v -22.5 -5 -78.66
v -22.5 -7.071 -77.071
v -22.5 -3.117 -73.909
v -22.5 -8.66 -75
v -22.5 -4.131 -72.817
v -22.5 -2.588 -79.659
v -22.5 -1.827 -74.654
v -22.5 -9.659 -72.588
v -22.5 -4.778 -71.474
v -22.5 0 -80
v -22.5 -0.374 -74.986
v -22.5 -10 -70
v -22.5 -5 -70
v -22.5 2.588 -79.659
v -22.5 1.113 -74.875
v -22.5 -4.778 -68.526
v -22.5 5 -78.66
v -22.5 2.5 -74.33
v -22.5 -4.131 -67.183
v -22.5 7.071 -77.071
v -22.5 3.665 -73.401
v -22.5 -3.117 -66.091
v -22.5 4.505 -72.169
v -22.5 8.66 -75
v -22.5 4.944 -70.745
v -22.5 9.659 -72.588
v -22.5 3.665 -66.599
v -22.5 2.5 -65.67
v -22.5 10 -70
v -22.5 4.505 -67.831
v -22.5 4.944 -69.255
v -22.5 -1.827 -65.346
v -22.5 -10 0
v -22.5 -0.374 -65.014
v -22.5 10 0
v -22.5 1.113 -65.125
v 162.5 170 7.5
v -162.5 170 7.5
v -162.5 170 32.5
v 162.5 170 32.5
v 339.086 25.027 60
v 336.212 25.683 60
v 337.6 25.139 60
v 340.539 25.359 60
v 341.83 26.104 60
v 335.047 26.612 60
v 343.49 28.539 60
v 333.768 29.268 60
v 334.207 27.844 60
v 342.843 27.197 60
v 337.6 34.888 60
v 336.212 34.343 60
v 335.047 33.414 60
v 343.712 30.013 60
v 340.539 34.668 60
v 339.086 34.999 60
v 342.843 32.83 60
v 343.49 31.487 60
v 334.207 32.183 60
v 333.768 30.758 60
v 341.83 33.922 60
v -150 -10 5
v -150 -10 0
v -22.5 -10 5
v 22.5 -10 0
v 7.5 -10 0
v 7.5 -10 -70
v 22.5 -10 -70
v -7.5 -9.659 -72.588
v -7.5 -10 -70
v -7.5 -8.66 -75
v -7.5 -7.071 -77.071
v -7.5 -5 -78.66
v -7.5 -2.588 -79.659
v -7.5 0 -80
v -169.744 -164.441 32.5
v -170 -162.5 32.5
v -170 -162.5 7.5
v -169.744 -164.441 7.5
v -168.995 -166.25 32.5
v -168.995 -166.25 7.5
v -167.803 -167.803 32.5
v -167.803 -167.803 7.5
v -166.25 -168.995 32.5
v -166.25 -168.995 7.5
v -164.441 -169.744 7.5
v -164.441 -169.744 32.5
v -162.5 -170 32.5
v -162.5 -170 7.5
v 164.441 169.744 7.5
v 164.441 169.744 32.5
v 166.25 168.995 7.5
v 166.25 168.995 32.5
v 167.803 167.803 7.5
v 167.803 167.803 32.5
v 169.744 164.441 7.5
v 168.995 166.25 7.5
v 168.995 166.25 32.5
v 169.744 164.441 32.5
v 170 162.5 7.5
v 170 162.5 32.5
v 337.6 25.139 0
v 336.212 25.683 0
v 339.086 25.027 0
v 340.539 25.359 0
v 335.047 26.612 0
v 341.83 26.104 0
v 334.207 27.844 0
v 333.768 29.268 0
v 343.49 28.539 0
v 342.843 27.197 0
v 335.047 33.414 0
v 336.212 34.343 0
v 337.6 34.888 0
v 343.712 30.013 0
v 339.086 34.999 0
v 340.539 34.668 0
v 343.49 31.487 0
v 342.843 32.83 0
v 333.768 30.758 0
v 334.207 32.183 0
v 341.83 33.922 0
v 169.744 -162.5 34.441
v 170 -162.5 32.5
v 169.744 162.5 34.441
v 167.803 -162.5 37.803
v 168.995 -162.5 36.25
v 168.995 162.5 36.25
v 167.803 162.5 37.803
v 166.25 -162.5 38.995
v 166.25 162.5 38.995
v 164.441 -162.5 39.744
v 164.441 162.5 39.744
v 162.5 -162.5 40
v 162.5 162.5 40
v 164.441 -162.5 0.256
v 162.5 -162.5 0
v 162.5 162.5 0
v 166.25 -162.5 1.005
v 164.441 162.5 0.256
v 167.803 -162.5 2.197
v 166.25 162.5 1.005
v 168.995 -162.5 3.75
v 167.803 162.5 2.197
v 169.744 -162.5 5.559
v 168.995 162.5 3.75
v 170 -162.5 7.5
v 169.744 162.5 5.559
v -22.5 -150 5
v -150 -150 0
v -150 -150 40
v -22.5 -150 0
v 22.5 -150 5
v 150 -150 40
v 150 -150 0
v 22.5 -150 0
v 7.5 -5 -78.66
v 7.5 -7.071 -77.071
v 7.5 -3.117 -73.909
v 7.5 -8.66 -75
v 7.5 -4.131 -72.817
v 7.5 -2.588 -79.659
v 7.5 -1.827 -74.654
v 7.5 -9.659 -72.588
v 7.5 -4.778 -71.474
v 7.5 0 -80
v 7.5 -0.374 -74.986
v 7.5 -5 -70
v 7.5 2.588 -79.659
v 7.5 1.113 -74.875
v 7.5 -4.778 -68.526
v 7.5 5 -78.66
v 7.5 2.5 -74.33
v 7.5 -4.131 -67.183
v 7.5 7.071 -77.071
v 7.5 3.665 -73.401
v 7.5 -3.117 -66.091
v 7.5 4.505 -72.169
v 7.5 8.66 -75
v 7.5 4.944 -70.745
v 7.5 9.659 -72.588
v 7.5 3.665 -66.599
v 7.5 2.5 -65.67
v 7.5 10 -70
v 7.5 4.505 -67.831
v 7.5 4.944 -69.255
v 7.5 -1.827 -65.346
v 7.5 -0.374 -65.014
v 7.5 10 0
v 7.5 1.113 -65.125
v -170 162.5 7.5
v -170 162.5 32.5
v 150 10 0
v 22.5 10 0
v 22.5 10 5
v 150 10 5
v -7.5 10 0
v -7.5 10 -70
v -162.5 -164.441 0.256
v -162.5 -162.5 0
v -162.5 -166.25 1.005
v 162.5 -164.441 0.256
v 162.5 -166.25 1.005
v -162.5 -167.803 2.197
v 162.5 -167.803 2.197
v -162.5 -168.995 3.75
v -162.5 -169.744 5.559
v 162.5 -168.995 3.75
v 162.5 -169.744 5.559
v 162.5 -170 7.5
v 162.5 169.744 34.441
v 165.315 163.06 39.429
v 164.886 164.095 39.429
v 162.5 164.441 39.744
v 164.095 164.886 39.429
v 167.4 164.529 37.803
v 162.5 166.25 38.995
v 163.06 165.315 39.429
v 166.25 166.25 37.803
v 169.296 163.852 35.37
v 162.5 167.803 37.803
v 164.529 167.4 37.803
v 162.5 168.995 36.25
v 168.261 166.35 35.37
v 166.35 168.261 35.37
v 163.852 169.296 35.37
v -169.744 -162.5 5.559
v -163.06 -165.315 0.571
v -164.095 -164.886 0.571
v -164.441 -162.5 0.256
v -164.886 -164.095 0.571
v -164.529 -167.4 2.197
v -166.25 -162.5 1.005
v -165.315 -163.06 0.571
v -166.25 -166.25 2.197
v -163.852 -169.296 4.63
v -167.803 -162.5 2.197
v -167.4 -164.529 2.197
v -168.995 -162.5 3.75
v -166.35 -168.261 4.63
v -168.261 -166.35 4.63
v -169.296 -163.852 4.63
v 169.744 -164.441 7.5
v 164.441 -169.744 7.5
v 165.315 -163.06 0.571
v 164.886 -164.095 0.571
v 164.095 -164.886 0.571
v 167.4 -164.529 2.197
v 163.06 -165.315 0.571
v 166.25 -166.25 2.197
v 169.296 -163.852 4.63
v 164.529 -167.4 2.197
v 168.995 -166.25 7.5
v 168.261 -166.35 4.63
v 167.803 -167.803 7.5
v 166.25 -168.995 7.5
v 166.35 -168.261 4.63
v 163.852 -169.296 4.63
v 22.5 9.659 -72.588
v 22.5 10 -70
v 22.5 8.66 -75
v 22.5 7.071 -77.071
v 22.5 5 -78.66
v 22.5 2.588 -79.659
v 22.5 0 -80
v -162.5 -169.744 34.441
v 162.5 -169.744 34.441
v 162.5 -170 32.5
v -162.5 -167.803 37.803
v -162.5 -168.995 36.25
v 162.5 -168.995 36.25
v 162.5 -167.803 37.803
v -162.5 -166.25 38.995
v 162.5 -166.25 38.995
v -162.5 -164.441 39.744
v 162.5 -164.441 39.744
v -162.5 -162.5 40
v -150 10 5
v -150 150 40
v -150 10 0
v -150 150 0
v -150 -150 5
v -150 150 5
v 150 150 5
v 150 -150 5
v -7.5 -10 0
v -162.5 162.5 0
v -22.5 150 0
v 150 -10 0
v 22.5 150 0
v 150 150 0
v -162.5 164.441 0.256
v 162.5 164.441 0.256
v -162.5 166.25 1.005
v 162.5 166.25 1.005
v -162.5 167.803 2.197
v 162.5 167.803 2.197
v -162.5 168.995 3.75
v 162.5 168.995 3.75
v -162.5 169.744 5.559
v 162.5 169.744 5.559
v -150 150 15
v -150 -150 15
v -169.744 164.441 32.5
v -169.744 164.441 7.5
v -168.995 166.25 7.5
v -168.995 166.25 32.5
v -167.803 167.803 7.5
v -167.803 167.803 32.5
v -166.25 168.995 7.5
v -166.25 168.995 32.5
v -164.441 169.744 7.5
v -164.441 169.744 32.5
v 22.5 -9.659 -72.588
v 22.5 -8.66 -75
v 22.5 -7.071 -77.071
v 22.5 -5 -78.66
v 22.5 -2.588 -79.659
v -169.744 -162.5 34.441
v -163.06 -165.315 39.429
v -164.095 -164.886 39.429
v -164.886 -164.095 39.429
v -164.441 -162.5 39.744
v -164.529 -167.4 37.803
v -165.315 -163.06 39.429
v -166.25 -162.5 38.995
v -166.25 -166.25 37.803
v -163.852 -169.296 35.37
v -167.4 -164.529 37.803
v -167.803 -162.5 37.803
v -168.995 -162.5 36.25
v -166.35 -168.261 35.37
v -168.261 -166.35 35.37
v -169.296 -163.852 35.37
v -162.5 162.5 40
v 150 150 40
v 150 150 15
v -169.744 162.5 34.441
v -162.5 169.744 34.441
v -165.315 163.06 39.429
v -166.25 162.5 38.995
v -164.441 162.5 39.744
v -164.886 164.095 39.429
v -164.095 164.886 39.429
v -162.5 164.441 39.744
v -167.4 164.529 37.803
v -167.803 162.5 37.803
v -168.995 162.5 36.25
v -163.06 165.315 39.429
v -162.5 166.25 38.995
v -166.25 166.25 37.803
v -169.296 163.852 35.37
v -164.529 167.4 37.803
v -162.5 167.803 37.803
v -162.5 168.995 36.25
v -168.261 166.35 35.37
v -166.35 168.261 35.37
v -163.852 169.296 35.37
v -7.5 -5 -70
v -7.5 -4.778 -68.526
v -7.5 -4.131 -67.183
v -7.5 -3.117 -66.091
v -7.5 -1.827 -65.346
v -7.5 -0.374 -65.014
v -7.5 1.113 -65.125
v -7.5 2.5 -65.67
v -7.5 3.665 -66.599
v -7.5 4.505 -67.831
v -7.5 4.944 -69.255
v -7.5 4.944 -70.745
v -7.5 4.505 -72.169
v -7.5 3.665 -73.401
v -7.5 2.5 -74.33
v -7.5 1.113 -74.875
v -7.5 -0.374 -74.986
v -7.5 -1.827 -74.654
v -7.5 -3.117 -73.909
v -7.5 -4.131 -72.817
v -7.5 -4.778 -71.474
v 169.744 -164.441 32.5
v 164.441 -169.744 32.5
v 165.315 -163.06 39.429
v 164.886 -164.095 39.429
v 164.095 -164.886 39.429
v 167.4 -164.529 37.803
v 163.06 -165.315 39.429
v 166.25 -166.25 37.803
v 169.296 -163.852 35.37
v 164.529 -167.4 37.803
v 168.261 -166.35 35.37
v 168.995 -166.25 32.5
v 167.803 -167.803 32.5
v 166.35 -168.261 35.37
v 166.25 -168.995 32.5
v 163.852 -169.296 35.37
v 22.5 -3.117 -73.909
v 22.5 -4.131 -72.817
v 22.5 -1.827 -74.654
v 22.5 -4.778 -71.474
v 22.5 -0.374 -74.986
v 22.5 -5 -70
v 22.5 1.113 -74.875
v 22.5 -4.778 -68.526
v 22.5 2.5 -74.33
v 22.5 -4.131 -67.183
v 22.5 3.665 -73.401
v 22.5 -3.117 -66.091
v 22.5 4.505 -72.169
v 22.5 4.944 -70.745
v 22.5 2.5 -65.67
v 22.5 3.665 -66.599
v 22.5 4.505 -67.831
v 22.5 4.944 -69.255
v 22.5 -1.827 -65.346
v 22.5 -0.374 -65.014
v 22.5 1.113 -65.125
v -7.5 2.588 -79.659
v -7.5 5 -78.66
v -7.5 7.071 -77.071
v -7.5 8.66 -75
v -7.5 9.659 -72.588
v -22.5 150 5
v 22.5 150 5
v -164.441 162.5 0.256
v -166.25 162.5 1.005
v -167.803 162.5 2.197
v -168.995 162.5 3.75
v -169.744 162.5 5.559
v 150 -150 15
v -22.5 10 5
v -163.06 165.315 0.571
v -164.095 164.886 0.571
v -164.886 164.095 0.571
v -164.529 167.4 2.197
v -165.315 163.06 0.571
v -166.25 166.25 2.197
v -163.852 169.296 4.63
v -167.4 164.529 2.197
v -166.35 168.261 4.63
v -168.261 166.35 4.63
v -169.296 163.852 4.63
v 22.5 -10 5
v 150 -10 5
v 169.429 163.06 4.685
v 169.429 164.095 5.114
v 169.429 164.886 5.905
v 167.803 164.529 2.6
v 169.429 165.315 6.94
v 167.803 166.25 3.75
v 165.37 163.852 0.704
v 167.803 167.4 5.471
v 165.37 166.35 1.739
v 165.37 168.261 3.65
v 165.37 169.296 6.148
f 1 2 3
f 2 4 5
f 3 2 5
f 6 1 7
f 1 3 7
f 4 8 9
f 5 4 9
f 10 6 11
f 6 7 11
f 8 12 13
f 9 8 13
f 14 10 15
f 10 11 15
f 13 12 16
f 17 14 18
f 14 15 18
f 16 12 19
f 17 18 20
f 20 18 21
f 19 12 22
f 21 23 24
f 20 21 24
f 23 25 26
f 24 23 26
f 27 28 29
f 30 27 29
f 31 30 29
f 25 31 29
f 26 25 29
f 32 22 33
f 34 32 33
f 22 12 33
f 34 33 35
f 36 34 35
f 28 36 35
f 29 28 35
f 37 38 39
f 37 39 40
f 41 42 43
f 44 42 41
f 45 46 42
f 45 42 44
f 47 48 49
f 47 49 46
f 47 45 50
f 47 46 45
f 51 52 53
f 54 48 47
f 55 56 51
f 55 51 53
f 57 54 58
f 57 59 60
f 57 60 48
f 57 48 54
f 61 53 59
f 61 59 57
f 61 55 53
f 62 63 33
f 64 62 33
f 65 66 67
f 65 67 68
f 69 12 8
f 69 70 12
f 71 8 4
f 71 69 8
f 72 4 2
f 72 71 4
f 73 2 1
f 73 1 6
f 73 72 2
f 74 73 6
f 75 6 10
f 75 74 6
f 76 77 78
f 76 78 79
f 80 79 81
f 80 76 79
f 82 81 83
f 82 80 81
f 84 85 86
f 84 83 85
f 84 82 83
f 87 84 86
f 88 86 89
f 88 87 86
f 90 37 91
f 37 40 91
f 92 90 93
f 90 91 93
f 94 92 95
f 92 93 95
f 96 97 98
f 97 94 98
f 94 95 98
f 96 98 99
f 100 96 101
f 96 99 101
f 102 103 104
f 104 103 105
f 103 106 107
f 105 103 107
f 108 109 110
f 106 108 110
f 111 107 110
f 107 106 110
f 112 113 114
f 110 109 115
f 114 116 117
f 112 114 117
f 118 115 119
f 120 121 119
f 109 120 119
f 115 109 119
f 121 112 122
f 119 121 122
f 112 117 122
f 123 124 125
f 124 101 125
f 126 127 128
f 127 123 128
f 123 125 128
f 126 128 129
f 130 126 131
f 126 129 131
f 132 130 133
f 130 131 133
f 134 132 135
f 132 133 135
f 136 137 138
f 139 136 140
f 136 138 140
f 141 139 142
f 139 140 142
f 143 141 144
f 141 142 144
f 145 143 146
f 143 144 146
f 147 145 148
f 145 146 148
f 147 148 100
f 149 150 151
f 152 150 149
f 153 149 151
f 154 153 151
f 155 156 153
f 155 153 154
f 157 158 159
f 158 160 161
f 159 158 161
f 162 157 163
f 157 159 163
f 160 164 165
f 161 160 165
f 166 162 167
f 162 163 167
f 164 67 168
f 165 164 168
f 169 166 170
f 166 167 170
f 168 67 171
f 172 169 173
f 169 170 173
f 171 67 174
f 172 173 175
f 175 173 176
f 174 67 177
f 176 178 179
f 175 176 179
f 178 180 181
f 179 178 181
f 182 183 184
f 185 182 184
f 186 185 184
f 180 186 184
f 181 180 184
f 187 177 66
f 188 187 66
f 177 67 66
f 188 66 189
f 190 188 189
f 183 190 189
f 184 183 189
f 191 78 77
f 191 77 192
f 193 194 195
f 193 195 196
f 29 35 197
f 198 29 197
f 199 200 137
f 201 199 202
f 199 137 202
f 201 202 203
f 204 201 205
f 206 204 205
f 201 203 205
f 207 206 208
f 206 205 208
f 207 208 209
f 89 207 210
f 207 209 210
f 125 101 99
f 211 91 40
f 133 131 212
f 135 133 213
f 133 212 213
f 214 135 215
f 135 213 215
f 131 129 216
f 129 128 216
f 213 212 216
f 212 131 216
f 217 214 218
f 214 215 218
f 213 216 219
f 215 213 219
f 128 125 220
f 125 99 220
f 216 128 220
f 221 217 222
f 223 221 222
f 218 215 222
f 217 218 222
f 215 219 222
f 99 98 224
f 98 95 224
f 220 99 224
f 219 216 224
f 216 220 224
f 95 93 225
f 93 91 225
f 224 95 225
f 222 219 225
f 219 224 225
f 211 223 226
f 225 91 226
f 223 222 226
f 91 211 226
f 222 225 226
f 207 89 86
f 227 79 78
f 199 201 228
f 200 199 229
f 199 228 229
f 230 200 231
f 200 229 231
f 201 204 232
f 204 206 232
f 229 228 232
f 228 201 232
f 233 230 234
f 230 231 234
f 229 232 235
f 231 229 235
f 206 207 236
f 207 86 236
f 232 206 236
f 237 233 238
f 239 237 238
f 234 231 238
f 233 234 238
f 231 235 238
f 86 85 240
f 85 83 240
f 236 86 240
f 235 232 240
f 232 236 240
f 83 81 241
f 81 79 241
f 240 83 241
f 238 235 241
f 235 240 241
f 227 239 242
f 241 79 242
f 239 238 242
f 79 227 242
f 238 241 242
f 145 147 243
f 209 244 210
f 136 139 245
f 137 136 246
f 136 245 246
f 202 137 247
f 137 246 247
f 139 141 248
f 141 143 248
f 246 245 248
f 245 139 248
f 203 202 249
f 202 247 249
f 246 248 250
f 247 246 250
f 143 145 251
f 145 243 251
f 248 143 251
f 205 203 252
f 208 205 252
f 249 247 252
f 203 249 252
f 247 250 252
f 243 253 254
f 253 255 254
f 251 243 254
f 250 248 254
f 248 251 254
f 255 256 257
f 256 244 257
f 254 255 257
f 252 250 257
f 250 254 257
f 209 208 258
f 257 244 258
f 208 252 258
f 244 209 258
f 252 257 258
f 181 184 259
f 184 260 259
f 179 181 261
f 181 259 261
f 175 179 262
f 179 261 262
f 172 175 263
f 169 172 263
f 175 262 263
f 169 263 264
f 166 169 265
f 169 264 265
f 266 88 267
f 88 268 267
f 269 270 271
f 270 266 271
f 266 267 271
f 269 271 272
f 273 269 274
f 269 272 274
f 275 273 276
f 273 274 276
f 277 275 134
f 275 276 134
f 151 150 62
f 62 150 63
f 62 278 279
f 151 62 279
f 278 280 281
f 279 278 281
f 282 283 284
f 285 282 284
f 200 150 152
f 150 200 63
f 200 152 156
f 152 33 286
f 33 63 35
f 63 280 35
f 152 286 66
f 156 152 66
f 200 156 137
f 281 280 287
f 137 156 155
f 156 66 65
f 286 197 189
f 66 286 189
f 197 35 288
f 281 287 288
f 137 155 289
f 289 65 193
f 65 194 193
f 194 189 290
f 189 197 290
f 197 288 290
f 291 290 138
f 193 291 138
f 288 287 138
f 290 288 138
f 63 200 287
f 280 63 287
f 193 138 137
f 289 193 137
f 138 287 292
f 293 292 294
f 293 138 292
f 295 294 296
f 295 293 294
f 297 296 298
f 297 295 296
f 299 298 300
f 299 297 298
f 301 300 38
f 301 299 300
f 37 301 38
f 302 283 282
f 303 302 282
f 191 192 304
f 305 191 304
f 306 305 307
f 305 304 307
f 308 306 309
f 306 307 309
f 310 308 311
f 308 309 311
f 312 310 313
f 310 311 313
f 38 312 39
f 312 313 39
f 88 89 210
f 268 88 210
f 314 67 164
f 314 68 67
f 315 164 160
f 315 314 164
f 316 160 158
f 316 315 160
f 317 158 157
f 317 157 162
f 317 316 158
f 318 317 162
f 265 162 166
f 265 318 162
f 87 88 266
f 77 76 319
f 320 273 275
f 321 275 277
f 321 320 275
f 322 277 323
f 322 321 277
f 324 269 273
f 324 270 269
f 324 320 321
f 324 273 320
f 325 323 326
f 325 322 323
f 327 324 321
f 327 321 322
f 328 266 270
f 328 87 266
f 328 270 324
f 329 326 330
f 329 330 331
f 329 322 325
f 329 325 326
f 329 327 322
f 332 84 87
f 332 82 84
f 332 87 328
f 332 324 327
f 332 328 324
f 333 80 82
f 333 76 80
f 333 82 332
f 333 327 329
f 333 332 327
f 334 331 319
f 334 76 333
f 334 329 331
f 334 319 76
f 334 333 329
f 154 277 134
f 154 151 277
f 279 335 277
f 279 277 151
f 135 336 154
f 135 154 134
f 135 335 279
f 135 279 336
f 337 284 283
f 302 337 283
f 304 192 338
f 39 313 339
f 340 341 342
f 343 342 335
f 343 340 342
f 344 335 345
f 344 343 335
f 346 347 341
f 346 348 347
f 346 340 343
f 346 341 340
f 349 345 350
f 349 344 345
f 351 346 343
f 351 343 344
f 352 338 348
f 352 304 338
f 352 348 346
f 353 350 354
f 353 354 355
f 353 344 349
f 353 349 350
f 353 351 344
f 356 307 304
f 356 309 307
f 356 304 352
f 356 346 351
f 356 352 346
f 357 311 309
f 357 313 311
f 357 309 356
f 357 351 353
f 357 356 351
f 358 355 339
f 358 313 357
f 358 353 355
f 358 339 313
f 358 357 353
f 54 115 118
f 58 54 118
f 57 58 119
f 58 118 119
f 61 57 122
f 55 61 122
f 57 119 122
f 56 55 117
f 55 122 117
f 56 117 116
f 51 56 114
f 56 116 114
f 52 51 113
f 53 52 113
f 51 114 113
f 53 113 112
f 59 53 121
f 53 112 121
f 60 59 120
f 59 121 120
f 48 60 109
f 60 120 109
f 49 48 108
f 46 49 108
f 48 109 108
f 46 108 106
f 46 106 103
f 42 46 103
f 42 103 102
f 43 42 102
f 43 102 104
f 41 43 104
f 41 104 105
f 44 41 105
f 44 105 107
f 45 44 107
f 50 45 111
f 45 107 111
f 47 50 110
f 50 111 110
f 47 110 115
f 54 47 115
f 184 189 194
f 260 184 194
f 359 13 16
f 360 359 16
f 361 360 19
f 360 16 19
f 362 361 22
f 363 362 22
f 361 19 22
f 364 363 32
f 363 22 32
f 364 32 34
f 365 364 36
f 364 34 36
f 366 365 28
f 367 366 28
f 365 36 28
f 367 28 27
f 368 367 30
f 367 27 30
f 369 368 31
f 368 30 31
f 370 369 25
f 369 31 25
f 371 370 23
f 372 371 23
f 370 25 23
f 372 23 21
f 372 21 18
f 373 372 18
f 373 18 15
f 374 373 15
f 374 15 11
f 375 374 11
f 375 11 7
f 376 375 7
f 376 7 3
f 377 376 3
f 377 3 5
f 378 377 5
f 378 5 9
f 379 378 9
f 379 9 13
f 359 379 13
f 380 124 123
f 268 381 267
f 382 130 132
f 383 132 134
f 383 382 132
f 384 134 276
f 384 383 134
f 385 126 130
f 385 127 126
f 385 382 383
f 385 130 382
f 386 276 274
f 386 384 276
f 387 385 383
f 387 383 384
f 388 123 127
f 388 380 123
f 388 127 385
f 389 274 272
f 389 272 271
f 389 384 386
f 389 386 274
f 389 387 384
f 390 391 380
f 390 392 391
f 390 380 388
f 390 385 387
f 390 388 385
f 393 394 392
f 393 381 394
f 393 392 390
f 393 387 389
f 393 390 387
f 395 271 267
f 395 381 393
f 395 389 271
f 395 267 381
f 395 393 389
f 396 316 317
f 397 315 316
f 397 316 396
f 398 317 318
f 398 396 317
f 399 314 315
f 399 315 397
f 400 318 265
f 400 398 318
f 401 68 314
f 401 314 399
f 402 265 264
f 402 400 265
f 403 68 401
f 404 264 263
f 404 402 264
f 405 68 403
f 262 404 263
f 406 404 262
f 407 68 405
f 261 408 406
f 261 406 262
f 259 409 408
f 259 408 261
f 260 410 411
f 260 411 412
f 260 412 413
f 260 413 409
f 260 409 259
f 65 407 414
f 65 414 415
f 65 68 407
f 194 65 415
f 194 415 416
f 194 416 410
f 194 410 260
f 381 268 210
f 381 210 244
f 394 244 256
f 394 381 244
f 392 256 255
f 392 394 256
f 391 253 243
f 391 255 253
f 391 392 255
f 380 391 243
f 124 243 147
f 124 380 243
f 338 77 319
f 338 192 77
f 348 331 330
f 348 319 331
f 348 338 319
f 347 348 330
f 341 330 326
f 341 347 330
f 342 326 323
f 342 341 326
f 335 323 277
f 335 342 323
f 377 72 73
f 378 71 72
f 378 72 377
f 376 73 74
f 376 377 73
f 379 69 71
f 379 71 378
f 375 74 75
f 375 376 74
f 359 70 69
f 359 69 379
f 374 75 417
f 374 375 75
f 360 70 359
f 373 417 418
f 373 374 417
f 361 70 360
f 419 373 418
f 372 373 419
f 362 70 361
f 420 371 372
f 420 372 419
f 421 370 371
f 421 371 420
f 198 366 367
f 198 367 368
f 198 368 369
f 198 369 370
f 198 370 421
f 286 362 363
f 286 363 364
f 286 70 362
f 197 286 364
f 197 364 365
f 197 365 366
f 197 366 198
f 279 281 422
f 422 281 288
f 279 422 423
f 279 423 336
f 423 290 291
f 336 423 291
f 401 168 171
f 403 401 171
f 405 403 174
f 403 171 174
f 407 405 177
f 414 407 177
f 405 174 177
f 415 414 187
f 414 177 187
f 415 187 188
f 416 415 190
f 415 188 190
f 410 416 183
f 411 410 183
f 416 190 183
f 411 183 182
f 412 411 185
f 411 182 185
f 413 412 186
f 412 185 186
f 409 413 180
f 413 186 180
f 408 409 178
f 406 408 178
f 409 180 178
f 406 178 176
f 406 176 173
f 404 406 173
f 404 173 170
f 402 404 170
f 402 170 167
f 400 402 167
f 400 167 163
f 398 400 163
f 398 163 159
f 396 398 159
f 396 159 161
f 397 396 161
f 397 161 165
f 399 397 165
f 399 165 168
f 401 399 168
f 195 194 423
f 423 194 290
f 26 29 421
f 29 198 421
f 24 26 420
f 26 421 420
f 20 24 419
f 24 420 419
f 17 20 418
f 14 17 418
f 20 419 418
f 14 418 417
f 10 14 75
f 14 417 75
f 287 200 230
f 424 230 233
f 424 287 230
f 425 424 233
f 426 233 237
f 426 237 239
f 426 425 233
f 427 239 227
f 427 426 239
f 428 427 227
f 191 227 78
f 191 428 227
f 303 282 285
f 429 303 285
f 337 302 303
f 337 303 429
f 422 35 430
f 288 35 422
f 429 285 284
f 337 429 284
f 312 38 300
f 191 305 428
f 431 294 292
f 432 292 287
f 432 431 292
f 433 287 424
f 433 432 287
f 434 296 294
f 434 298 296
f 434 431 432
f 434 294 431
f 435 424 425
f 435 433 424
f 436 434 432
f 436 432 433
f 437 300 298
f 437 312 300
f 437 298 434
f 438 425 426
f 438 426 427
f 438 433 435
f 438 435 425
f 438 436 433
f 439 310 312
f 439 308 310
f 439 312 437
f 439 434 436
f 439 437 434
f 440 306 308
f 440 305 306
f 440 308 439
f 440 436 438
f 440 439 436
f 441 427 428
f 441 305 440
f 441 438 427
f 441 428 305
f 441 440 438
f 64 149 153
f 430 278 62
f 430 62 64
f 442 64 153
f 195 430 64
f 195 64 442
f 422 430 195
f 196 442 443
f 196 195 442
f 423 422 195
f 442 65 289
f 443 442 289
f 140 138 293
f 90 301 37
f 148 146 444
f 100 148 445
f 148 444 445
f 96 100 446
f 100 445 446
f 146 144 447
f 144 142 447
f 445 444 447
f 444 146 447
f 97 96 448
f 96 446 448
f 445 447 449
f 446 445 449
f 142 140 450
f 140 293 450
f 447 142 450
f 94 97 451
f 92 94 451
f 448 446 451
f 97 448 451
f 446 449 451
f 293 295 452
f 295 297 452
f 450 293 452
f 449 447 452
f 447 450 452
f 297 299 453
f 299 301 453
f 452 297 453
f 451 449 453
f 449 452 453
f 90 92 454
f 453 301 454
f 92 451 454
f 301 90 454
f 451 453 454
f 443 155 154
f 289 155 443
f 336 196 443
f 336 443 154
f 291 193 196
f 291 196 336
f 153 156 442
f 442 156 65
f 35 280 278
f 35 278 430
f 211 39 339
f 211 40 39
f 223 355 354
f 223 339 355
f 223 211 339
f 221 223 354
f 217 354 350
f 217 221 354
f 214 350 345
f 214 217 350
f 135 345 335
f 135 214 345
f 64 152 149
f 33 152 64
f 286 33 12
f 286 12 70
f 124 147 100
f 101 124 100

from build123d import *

# Parameters (mm, degrees)
F0_W      = 340
F0_H      = 340
F0_W_2    = 300
F0_H_2    = 300
F1_DEPTH  = 40
F2_DEPTH  = 5
F3_W      = 15
F3_H      = 20
F4_DEPTH  = 80
F5_R      = 9.99999
F6_R      = 7.5
F7_R      = 5
F8_DEPTH  = 45
F0_R      = 5
F10_DEPTH = 60
F3_W_2    = 127.5
F3_H_2    = 140
F11_DEPTH = 60.001
F12_W     = 127.5
F12_H     = 140
F13_DEPTH = 10


# Not quite as in the source:
# - a fillet or chamfer is up to 0.001 mm smaller than in the source, because OpenCascade refuses the exact size


with BuildPart() as f1:
    # F0 (on Top) → F1 (new body)
    with BuildSketch(Plane.XY):
        Rectangle(F0_W, F0_H)
        Rectangle(F0_W_2, F0_H_2, mode=Mode.SUBTRACT)
    extrude(amount=F1_DEPTH)

    # F0 (on Top) → F2 (join)
    with BuildSketch(Plane.XY):
        Rectangle(F0_W_2, F0_H_2)
    extrude(amount=F2_DEPTH)

    # F3 (on face) → F4 (join)
    with BuildSketch(Plane.XY):
        with Locations((15, 0)):
            Rectangle(F3_W, F3_H)
        with Locations((-15, 0)):
            Rectangle(F3_W, F3_H)
    extrude(amount=-F4_DEPTH)

    # F5 (radius 10 in the source; OpenCascade refuses exactly that, so slightly less here)
    f5_edges = [f1.edges().sort_by_distance(p)[0] for p in [
        (-15, -10, -80),
        (-15, 10, -80),
        (15, -10, -80),
        (15, 10, -80),
    ]]
    fillet(f5_edges, radius=F5_R)

    # F6
    f6_edges = [f1.edges().sort_by_distance(p)[0] for p in [
        (-170, -170, 20),
        (170, -170, 20),
        (-170, 170, 20),
        (0, 170, 0),
        (170, 0, 0),
        (170, 170, 20),
        (170, 0, 40),
        (0, -170, 40),
        (0, -170, 0),
        (-170, 0, 40),
        (-170, 0, 0),
        (0, 170, 40),
    ]]
    fillet(f6_edges, radius=F6_R)


with BuildPart() as f8:
    # F7 (on face) → F8 (new body)
    with BuildSketch(Plane(origin=(-22.5, 0, 0), x_dir=(0, -1, 0), z_dir=(-1, 0, 0))):
        with Locations((0, -70)):
            Circle(F7_R)
    extrude(amount=-F8_DEPTH)


with BuildPart() as f1_1:
    add(f1.part)

    # F9: cut F8
    add(f8.part, mode=Mode.SUBTRACT)

    # F3 (on face) → F11 (cut, through all)
    with BuildSketch(Plane.XY):
        with Locations((-86.25, 80)):
            Rectangle(F3_W_2, F3_H_2)
        with Locations((86.25, 80)):
            Rectangle(F3_W_2, F3_H_2)
        with Locations((86.25, -80)):
            Rectangle(F3_W_2, F3_H_2)
        with Locations((-86.25, -80)):
            Rectangle(F3_W_2, F3_H_2)
    extrude(amount=F11_DEPTH, mode=Mode.SUBTRACT)


with BuildPart() as f10:
    # F0 (on Top) → F10 (new body)
    with BuildSketch(Plane.XY):
        with Locations((338.7121260166, 30.0132371485)):
            Circle(F0_R)
    extrude(amount=F10_DEPTH)


with BuildPart() as f13:
    # F12 (on face) → F13 (new body)
    with BuildSketch(Plane.XY.offset(5)):
        with Locations((86.25, 80)):
            Rectangle(F12_W, F12_H)
        Polygon((22.5, 10), (22.5, 150), (-22.5, 150), (-22.5, 10), (-150, 10), (-150, -10), (-22.5, -10), (-22.5, -150), (22.5, -150), (22.5, -10), (150, -10), (150, 10), align=None)
        with Locations((-86.25, 80)):
            Rectangle(F12_W, F12_H)
        with Locations((86.25, -80)):
            Rectangle(F12_W, F12_H)
        with Locations((-86.25, -80)):
            Rectangle(F12_W, F12_H)
    extrude(amount=F13_DEPTH)


solid = Compound([f1_1.part, f10.part, f13.part])
